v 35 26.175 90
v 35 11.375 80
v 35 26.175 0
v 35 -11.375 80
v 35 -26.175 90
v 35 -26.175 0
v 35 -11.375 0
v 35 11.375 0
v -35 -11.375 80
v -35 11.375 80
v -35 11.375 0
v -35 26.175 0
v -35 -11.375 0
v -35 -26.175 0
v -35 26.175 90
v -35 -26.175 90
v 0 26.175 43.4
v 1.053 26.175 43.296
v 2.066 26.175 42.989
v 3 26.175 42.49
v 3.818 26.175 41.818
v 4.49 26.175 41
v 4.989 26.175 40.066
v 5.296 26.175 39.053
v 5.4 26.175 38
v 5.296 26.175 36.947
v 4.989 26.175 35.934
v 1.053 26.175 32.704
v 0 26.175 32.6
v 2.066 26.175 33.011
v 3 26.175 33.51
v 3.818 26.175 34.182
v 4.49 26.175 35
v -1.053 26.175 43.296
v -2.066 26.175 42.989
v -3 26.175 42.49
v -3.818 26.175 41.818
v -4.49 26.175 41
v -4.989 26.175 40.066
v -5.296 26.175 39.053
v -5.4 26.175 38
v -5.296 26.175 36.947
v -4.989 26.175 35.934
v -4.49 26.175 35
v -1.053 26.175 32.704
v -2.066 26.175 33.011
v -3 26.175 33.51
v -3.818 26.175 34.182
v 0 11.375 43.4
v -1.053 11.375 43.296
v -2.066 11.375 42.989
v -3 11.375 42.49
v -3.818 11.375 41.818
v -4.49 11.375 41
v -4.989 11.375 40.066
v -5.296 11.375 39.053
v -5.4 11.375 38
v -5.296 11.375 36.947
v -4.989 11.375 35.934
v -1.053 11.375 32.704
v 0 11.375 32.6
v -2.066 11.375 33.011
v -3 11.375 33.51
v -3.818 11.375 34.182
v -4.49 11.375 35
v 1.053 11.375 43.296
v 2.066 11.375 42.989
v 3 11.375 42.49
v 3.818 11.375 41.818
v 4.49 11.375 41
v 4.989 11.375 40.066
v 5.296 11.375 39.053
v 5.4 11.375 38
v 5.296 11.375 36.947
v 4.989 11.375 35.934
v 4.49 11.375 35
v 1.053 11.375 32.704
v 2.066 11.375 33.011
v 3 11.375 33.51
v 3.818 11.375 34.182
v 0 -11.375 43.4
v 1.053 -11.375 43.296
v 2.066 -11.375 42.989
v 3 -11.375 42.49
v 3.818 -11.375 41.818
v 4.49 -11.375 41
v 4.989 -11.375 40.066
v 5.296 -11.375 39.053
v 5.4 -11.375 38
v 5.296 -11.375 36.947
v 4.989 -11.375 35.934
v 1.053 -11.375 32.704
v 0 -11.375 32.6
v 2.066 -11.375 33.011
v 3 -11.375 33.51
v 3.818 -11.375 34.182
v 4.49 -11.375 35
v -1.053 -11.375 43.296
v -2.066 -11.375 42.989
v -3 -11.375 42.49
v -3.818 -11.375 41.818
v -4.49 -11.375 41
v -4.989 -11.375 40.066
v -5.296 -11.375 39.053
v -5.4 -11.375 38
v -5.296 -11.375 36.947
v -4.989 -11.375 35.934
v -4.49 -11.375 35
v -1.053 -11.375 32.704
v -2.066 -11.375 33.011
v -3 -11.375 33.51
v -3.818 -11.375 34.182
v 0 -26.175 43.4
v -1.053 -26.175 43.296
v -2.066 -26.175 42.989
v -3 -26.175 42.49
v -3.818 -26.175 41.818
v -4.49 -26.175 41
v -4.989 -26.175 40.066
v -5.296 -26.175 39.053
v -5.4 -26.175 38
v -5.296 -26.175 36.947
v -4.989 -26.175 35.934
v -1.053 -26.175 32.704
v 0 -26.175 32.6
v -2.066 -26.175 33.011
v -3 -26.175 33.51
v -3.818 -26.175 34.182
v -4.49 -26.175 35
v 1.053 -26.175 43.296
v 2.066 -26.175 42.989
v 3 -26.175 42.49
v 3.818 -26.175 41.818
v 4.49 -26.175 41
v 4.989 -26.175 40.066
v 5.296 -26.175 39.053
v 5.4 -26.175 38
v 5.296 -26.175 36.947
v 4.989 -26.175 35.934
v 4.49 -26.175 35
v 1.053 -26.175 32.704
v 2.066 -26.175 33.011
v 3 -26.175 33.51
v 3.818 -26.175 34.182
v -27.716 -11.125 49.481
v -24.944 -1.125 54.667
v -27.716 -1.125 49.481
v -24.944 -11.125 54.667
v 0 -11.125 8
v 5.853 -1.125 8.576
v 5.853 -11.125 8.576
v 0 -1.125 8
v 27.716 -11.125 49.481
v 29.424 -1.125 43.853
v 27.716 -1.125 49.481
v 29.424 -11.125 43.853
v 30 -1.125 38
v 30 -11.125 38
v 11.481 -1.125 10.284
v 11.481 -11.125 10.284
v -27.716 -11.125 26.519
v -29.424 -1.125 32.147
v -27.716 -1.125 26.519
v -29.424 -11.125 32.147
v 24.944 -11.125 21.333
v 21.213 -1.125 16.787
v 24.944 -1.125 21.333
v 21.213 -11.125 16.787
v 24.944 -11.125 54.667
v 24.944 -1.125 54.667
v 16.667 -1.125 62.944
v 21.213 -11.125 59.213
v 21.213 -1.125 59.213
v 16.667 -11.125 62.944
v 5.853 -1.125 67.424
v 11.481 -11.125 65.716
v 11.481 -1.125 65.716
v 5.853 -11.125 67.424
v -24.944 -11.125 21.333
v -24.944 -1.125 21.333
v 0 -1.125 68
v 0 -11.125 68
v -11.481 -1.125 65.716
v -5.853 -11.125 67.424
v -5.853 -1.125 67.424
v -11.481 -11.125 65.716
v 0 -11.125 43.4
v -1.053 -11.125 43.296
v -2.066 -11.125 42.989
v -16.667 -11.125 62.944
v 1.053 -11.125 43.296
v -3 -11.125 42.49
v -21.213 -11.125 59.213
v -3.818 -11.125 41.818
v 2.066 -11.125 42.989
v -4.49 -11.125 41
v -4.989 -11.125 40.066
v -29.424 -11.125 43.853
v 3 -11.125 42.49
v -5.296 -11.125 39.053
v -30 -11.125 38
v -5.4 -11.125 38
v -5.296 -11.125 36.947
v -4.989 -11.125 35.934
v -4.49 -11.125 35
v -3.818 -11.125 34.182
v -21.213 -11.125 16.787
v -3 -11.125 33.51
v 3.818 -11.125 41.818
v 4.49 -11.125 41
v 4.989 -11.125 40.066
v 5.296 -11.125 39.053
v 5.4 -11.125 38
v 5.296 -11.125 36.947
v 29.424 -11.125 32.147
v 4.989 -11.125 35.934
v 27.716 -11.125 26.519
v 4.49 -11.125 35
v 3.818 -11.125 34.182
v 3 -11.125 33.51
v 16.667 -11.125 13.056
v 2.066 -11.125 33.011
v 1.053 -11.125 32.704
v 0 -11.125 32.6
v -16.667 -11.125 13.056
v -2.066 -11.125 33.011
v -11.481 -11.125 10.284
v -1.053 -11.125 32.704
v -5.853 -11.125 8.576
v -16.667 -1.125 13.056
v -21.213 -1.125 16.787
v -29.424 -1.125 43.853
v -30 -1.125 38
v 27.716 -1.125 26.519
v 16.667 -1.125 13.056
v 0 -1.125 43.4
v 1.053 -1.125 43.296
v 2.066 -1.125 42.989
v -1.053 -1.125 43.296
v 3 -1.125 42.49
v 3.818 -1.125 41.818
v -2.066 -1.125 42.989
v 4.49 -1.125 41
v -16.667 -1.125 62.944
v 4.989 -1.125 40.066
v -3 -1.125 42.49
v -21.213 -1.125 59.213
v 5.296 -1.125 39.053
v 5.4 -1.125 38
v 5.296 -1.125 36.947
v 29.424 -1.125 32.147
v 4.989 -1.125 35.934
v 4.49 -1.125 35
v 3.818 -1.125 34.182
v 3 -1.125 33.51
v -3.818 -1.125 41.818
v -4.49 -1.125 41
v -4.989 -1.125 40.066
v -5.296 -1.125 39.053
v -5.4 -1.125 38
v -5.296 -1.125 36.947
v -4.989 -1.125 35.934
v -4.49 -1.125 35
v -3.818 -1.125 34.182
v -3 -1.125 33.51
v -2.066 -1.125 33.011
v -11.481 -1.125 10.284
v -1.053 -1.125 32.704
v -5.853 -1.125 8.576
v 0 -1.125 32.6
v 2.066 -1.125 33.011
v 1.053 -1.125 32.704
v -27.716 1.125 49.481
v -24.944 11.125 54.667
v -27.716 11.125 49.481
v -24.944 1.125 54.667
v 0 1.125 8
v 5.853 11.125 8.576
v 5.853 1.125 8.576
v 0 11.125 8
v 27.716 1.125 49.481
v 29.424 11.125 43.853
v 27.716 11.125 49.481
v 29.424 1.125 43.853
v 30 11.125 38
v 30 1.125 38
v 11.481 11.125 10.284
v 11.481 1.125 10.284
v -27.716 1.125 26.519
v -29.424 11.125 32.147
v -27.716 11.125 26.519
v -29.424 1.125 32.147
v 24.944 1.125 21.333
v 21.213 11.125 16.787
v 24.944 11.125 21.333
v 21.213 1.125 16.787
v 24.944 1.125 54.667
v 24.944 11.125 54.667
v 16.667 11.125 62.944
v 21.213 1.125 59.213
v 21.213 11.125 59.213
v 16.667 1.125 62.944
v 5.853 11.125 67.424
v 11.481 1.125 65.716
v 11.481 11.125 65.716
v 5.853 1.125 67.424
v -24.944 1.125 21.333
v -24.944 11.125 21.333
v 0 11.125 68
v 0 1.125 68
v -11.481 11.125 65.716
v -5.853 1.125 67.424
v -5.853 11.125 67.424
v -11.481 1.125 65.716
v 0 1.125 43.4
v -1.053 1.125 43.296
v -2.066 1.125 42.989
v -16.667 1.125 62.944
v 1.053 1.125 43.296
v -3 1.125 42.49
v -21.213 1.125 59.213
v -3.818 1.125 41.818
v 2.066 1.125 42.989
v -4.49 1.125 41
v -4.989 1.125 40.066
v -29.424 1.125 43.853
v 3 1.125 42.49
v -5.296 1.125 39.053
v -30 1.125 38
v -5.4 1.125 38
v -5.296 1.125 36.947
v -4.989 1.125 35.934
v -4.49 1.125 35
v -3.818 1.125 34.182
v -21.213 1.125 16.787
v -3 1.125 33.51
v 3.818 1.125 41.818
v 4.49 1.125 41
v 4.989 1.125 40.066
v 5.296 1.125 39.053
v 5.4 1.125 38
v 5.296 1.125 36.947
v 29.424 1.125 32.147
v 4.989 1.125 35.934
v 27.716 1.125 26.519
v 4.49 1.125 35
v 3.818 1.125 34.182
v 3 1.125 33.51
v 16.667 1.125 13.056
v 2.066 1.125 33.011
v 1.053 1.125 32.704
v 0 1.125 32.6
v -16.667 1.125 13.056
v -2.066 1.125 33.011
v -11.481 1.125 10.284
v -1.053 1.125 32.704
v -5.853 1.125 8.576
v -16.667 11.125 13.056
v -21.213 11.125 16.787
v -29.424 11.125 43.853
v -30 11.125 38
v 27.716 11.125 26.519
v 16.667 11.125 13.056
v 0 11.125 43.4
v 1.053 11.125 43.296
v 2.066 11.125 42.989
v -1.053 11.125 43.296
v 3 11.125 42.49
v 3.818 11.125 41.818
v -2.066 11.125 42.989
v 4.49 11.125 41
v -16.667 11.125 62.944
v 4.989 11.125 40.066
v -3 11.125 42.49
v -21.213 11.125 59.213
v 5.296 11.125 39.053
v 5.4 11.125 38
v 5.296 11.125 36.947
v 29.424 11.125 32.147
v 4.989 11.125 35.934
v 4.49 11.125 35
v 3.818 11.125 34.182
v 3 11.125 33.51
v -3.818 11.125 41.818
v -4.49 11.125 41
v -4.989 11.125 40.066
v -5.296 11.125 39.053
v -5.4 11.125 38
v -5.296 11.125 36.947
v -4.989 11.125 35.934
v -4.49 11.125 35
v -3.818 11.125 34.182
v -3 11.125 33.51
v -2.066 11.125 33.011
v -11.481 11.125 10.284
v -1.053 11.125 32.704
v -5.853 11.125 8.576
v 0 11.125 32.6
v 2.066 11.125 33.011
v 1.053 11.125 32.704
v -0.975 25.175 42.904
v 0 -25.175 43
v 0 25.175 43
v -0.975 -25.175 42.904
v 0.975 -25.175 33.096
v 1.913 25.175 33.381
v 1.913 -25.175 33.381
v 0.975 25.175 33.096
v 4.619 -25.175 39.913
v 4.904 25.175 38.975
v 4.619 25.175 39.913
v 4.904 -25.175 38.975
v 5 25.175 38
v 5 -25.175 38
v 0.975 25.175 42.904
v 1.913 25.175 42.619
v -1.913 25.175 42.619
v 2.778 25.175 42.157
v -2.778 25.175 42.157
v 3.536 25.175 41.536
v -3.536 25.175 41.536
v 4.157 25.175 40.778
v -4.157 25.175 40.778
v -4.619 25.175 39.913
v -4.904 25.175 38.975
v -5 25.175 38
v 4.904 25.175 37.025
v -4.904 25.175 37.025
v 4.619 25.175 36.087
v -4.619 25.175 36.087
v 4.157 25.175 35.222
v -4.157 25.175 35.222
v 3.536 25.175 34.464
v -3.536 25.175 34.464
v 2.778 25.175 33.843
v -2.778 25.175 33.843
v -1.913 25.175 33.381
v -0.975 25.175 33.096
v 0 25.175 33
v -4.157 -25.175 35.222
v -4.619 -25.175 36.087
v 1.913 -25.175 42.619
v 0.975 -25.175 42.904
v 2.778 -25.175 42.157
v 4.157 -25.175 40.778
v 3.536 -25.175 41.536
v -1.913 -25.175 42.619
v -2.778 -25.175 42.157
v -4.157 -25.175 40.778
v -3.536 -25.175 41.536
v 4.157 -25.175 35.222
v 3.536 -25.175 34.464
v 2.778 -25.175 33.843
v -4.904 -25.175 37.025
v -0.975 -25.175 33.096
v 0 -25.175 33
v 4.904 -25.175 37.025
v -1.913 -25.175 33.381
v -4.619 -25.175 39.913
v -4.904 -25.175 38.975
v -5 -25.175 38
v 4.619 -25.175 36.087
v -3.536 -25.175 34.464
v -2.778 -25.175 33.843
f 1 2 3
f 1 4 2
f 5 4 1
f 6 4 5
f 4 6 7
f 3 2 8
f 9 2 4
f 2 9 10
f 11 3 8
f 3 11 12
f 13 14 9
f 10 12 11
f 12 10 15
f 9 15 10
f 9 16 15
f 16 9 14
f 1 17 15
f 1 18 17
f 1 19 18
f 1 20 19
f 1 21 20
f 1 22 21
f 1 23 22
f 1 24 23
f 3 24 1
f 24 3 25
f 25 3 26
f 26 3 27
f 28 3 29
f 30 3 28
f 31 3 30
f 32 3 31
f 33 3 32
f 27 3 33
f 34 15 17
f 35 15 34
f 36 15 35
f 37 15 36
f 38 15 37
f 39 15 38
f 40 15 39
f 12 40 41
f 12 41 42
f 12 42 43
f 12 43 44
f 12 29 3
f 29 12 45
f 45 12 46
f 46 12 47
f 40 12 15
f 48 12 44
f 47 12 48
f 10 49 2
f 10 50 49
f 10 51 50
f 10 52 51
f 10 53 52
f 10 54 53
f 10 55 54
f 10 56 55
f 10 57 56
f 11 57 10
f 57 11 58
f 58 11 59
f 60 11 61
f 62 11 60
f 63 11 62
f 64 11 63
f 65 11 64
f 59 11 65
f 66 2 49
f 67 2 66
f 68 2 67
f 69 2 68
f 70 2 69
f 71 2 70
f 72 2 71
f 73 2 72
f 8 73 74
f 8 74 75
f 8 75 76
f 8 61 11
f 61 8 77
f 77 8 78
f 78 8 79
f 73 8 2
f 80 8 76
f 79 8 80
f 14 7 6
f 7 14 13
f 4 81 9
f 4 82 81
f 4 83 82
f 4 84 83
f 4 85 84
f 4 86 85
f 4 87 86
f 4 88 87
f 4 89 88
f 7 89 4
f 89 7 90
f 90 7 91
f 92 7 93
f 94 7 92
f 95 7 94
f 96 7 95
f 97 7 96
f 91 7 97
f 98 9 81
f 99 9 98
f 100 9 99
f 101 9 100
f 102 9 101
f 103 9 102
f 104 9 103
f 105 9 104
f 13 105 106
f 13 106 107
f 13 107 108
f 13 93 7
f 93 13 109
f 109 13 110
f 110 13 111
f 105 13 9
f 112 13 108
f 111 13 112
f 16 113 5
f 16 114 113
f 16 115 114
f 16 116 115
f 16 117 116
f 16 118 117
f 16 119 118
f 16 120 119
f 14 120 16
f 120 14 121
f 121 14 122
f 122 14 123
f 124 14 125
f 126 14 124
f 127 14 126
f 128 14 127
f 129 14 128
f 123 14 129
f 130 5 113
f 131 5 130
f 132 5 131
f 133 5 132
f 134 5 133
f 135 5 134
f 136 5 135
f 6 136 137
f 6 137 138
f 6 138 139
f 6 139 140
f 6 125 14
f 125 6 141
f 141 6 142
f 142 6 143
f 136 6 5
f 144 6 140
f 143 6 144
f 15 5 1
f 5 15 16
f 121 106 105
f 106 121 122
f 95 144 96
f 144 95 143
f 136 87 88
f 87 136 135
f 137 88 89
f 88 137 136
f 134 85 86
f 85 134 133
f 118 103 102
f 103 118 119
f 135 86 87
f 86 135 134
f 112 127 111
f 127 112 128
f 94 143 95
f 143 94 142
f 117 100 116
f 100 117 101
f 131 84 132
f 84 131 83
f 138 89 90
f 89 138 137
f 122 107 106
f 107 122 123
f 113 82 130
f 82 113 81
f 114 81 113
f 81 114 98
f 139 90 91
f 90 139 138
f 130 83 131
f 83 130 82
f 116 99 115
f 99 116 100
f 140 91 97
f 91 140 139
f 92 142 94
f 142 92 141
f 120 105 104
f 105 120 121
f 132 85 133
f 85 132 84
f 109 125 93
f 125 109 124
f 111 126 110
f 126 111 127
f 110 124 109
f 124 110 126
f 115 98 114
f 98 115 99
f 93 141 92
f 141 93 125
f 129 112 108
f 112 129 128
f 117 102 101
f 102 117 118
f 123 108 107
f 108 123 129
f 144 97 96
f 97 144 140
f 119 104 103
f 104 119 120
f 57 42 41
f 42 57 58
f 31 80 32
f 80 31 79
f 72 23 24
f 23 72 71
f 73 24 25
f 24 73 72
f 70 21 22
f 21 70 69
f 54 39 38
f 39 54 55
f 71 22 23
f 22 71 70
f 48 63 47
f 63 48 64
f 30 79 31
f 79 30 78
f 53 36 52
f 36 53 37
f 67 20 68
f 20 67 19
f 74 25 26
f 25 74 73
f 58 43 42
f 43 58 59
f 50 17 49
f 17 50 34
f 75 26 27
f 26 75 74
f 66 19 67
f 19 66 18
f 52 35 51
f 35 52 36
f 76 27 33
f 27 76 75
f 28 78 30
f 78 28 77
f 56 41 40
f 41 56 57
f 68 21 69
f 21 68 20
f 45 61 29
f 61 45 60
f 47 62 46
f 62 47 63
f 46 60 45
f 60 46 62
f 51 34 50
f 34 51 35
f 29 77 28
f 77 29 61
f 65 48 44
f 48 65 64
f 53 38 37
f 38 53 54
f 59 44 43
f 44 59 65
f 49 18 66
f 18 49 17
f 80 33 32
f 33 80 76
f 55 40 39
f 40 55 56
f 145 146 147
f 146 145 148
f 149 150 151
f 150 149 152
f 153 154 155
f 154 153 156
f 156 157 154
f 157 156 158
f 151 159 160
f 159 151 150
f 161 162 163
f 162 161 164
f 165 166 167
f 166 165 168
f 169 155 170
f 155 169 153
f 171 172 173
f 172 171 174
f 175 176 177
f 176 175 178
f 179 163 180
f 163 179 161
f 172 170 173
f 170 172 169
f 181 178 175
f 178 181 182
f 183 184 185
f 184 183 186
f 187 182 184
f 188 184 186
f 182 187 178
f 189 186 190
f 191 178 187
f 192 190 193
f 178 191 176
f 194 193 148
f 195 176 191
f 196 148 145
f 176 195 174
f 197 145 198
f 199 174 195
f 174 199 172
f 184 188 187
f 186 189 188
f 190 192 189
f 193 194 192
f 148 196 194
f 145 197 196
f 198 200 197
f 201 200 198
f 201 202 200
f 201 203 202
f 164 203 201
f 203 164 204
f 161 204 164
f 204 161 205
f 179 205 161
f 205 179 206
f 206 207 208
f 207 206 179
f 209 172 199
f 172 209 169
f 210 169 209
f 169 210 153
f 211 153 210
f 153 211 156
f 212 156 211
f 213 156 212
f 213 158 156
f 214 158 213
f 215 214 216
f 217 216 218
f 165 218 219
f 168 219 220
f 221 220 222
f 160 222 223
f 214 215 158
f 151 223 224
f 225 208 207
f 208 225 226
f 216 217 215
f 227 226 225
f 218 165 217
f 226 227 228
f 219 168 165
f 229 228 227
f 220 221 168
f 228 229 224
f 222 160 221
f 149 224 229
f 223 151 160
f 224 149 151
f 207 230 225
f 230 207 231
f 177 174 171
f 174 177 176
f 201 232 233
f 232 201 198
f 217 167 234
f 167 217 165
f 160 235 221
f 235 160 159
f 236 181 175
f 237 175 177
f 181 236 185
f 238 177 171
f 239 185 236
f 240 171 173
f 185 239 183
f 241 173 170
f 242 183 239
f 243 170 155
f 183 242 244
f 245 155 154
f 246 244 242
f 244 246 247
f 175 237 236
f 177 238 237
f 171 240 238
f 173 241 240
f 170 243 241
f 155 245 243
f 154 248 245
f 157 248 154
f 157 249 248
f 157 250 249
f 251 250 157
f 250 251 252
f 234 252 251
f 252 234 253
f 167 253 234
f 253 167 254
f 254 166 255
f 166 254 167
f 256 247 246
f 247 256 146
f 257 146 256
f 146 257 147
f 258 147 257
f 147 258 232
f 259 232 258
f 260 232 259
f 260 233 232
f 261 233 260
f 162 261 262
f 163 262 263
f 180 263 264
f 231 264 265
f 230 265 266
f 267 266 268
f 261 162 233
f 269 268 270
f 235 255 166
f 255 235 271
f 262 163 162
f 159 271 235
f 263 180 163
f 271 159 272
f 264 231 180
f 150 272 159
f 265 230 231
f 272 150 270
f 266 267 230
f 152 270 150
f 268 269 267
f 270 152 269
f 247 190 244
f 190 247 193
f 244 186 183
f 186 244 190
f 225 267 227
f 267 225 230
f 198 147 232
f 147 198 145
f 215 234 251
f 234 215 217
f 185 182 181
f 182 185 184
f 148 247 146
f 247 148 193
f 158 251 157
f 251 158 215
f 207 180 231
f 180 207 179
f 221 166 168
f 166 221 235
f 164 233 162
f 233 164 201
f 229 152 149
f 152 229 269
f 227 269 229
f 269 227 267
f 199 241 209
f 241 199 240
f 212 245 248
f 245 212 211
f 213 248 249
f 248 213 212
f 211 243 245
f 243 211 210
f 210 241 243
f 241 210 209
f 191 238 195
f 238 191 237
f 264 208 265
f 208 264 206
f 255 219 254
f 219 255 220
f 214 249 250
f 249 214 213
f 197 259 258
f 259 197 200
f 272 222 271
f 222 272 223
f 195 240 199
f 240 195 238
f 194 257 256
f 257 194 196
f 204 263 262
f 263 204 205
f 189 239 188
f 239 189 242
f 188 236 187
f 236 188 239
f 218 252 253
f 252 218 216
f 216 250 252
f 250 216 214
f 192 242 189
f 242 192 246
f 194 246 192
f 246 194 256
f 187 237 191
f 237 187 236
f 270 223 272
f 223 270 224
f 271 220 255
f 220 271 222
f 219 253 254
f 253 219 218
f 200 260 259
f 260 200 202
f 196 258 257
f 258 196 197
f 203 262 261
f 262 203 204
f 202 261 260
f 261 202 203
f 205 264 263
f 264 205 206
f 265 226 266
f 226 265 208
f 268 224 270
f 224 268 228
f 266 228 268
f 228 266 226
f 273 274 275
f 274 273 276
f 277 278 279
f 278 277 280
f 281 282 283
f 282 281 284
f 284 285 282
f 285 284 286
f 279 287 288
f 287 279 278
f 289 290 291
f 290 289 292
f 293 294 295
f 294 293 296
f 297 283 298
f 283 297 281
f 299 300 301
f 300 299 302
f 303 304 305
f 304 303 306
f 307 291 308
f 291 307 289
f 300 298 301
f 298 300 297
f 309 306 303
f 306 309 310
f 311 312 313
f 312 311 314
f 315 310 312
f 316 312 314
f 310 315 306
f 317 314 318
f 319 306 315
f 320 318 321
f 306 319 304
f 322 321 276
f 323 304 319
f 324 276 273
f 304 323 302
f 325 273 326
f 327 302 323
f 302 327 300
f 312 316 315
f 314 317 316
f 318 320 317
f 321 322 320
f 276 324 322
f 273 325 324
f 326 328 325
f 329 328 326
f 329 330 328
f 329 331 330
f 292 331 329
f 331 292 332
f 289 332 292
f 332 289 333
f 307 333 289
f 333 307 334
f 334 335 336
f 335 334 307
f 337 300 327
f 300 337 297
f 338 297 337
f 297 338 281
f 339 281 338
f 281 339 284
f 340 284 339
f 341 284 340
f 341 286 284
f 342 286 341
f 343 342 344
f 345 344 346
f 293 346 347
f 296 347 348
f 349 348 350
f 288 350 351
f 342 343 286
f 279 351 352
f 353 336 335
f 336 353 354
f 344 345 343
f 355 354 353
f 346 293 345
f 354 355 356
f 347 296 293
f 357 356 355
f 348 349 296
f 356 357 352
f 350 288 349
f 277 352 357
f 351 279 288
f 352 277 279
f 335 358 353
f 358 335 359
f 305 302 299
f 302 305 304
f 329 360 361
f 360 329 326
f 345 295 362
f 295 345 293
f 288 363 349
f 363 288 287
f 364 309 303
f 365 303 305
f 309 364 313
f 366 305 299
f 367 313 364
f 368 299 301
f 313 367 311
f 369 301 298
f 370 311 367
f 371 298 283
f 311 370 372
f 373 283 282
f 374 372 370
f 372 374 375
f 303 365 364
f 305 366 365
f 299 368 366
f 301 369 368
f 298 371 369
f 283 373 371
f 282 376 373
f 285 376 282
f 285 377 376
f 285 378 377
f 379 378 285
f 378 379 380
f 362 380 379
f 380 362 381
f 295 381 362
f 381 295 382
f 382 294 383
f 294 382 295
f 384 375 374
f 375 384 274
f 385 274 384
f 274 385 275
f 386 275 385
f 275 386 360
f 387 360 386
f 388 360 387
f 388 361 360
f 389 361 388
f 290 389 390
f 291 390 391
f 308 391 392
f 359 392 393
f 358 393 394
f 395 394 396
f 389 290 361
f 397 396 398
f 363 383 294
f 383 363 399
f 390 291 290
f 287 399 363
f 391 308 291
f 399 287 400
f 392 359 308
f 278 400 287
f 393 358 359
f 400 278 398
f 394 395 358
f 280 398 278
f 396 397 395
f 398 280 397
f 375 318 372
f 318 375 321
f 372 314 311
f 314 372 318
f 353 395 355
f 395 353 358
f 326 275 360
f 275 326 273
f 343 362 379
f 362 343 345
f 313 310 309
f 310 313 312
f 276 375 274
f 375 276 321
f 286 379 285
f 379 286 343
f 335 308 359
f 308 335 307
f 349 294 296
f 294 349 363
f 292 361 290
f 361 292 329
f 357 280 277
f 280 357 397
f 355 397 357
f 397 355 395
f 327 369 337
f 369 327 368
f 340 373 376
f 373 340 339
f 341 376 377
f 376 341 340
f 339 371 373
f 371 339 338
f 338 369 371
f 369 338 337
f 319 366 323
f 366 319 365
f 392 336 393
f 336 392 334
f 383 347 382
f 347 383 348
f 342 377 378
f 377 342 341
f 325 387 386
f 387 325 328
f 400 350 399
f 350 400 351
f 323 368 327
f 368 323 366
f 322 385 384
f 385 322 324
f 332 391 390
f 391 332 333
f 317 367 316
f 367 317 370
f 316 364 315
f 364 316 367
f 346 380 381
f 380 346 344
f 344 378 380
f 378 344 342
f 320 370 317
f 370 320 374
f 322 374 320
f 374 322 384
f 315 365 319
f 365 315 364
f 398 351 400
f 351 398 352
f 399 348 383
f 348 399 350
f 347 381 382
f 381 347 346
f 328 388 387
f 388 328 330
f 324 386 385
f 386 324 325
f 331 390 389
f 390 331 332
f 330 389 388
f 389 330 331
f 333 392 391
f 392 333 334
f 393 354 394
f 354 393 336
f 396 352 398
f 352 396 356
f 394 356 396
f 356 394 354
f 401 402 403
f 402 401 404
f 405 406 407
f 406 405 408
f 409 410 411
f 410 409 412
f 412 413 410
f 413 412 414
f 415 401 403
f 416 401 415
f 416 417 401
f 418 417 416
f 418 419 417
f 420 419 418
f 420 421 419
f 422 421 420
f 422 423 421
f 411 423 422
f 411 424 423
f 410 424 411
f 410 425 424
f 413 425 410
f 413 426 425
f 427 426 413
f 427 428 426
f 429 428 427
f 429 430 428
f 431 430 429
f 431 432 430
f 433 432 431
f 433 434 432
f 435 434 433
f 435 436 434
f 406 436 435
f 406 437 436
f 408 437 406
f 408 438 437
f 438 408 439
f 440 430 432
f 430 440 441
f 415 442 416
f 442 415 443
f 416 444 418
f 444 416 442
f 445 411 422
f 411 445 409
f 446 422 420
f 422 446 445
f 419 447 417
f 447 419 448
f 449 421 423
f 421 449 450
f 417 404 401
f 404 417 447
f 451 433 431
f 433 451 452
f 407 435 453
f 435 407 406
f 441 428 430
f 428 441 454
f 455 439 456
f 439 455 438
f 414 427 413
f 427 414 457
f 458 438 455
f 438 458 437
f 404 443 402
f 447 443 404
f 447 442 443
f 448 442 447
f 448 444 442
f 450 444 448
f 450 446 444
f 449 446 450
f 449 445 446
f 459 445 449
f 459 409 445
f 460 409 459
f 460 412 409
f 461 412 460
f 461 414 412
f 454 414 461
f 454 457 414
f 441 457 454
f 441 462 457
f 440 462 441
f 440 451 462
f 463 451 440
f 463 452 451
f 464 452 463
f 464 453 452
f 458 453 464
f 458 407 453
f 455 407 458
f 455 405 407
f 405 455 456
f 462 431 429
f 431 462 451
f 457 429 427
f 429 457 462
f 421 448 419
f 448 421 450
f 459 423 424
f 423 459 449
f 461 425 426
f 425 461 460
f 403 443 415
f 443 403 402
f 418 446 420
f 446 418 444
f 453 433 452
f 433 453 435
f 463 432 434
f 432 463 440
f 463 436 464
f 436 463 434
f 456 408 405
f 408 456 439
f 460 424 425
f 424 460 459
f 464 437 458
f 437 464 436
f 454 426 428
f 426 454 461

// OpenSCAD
$fn = 32;

// ------------------------------------------------------------------------
// Trolley wheel set: wheels d60, fork 80 mm tall
// Every part is its own module, assembly() places every instance.
// ------------------------------------------------------------------------

// --- part 1 ---
module trolley_fork() {
  difference() {
    union() {
      translate([-35, 11.375, 0]) cube([70, 14.8, 80]);
      translate([-35, -26.175, 0]) cube([70, 14.8, 80]);
      translate([-35, -26.175, 80]) cube([70, 52.35, 10]);
    }
    translate([0, -18.775, 38]) rotate([90, 0, 0]) cylinder(h = 16.8, d = 10.8, center = true);
    translate([0, 18.775, 38]) rotate([90, 0, 0]) cylinder(h = 16.8, d = 10.8, center = true);
  }
}

// --- part 2 ---
module trolley_wheel() {
  difference() {
      translate([0, 0, 0]) cylinder(h = 10, d = 60);
      translate([0, 0, -1]) cylinder(h = 12, d = 10.8);
    }
}

// --- part 3 ---
module trolley_axle() {
  translate([0, 0, -25.175]) cylinder(h = 50.35, d = 10);
}

// --- assembly ---
module assembly() {
  color([0.80, 0.24, 0.20]) translate([0, 0, 0]) rotate([0, 0, 0]) trolley_fork();
  color([0.20, 0.45, 0.75]) translate([0, -1.125, 38]) rotate([90, 0, 0]) trolley_wheel();
  color([0.25, 0.62, 0.32]) translate([0, 11.125, 38]) rotate([90, 0, 0]) trolley_wheel();
  color([0.92, 0.70, 0.18]) translate([0, 0, 38]) rotate([90, 0, 0]) trolley_axle();
}

assembly();
